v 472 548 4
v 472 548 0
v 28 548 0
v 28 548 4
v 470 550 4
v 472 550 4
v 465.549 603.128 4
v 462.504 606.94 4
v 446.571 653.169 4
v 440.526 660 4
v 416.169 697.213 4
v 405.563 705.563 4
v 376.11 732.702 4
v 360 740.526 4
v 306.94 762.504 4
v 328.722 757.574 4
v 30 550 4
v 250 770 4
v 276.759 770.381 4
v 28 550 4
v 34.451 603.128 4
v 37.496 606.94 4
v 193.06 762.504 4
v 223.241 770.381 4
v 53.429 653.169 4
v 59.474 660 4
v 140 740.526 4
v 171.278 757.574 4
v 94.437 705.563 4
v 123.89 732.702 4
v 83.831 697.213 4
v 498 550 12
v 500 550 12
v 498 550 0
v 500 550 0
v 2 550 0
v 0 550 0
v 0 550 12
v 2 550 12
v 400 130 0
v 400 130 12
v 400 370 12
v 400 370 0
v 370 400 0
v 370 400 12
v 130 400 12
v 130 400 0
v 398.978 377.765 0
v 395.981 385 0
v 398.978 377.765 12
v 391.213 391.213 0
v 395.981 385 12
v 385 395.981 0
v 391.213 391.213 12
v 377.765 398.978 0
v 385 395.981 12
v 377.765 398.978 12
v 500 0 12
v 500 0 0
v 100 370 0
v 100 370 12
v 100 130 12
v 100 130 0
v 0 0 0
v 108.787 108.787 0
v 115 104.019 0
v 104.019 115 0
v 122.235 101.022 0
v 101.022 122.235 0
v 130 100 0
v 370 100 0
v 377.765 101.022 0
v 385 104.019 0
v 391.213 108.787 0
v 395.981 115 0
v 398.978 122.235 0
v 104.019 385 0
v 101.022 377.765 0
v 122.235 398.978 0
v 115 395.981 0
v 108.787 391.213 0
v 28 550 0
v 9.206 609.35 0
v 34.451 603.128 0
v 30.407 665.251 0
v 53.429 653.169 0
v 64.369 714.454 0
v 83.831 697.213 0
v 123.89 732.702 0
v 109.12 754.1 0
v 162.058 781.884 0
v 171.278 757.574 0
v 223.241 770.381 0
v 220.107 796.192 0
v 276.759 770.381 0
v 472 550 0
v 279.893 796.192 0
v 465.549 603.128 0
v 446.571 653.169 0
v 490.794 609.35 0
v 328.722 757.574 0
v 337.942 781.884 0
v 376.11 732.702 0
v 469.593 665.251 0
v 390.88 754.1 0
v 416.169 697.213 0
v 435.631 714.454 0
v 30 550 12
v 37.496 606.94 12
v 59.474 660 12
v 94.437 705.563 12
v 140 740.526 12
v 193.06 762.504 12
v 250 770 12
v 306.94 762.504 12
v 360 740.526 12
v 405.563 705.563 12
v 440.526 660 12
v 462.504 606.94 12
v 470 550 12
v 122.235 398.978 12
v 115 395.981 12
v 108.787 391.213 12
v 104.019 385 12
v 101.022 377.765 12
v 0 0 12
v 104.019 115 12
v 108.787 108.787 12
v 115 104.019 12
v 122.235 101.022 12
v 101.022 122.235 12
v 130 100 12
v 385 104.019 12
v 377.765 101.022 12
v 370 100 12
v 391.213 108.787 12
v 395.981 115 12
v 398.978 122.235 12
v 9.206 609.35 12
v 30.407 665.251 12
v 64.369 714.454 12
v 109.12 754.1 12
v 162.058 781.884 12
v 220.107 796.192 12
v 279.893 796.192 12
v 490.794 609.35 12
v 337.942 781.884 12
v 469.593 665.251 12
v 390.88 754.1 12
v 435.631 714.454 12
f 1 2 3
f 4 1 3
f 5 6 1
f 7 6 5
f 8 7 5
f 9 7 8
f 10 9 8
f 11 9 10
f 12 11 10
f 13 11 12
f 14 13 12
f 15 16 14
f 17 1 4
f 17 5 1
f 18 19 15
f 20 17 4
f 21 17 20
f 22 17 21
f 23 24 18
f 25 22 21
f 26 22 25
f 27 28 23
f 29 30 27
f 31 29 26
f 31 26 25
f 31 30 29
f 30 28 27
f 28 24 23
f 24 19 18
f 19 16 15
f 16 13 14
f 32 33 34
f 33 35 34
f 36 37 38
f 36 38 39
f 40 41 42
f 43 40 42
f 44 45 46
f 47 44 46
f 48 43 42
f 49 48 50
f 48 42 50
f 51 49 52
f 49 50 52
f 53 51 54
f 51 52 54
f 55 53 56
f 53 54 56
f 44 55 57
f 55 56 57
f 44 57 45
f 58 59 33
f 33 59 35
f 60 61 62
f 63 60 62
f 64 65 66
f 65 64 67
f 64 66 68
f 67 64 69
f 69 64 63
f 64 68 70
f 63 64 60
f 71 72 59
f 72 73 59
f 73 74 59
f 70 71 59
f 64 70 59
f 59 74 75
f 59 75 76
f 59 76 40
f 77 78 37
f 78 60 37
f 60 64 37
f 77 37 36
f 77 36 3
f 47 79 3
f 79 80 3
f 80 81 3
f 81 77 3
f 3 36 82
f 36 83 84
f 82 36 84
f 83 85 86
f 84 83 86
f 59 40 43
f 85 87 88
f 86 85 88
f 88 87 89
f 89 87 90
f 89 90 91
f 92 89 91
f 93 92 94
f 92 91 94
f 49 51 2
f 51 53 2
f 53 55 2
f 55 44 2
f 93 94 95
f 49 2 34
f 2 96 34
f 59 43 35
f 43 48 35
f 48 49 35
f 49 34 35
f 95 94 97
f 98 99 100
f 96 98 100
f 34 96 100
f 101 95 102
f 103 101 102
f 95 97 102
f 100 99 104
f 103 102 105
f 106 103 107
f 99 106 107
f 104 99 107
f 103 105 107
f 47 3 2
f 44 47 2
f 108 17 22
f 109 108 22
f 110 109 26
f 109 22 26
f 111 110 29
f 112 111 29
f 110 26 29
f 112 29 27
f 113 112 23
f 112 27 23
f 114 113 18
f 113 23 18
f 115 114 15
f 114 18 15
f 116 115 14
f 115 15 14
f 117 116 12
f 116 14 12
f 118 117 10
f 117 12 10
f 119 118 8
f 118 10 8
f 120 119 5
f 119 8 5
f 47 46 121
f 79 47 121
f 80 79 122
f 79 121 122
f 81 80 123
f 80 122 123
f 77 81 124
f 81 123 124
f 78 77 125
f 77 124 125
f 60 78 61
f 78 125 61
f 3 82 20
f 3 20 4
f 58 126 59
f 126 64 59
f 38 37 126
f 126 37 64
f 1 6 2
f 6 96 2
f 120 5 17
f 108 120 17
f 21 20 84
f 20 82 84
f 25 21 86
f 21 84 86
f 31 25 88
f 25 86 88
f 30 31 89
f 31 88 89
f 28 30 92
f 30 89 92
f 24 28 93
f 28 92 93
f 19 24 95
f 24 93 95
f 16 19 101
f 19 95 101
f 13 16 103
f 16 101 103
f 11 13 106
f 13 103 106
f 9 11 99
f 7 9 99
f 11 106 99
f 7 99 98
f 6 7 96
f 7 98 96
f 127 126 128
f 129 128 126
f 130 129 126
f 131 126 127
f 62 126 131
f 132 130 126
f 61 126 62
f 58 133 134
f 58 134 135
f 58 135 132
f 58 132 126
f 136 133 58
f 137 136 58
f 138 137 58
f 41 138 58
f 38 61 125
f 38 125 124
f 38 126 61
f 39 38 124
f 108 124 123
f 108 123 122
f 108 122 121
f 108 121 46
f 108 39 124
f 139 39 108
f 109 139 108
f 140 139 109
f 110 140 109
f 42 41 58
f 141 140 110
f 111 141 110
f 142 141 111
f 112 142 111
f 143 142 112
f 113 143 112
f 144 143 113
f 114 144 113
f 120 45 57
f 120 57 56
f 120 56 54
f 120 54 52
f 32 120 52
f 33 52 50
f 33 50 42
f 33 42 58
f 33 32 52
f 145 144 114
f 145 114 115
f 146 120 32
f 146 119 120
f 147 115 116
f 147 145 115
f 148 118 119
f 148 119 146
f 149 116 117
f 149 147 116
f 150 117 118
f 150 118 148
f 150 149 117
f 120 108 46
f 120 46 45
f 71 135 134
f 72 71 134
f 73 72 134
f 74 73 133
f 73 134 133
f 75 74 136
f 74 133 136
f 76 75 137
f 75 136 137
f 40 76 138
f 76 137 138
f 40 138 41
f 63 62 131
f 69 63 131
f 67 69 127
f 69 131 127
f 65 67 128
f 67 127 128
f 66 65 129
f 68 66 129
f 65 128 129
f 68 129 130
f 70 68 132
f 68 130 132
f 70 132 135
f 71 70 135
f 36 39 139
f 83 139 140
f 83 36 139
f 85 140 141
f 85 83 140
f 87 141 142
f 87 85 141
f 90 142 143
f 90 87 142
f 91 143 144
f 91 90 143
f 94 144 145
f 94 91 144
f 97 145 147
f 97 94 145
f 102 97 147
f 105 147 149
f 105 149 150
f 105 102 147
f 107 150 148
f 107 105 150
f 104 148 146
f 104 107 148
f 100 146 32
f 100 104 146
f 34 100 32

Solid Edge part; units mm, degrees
sketch "Sketch1" plane through (0, 0, 0) normal (0, 0, 1) x (1, 0, 0)
  line L0 (0, 0) -> (500, 0)
  line L1 (500, 0) -> (500, 550)
  arc A0 (0, 550) -> (500, 550) centre (250, 550) cw
  line L2 (0, 550) -> (0, 0)
  dimension "D1" = 550
  dimension "D2" = 500
extrude "Protrusion1" add sketch "Sketch1" along normal blind 12
sketch "Sketch2" plane through (250, 400, 12) normal (0, 0, 1) x (1, 0, 0)
  line L0 (-120, -300) -> (120, -300)
  arc A0 (150, -270) -> (120, -300) centre (120, -270) cw
  line L1 (150, -270) -> (150, -30)
  arc A1 (120, 0) -> (150, -30) centre (120, -30) cw
  line L2 (120, 0) -> (-120, 0)
  arc A2 (-150, -30) -> (-120, 0) centre (-120, -30) cw
  line L3 (-150, -30) -> (-150, -270)
  arc A3 (-120, -300) -> (-150, -270) centre (-120, -270) cw
  dimension "D1" = 100
  dimension "D2" = 300
  dimension "D3" = 300
  dimension "D4" = 100
  dimension "D5" = 100
extrude "Boxenloch" cut sketch "Sketch2" against normal blind 429.6561
sketch "Sketch3" plane through (250, 400, 0) normal (0, 0, -1) x (-1, 0, 0)
  line L0 (-220, 150) -> (220, 150)
  arc A0 (-220, 150) -> (220, 150) centre (0, 150) cw
extrude "Ausschnitt_4" cut sketch "Sketch3" against normal blind 186.1515
sketch "Sketch4" plane through (250, 400, 0) normal (0, 0, -1) x (-1, 0, 0)
  arc A0 (222, 150) -> (-222, 150) centre (0, 150) ccw
  line L0 (-222, 150) -> (-222, 148)
  line L1 (-222, 148) -> (222, 148)
  line L2 (222, 150) -> (222, 148)
  dimension "D1" = 222
extrude "Ausschnitt_5" cut sketch "Sketch4" against normal blind 4
sketch "Sketch5" plane through (250, 400, 0) normal (0, 0, -1) x (-1, 0, 0)
  line L0 (250, 150) -> (248, 150)
  arc A0 (-248, 150) -> (248, 150) centre (0, 150) cw
  line L1 (-250, 150) -> (-248, 150)
  arc A1 (250, 150) -> (-250, 150) centre (0, 150) ccw
extrude "Ausschnitt_6" cut sketch "Sketch5" against normal blind 184.2167
